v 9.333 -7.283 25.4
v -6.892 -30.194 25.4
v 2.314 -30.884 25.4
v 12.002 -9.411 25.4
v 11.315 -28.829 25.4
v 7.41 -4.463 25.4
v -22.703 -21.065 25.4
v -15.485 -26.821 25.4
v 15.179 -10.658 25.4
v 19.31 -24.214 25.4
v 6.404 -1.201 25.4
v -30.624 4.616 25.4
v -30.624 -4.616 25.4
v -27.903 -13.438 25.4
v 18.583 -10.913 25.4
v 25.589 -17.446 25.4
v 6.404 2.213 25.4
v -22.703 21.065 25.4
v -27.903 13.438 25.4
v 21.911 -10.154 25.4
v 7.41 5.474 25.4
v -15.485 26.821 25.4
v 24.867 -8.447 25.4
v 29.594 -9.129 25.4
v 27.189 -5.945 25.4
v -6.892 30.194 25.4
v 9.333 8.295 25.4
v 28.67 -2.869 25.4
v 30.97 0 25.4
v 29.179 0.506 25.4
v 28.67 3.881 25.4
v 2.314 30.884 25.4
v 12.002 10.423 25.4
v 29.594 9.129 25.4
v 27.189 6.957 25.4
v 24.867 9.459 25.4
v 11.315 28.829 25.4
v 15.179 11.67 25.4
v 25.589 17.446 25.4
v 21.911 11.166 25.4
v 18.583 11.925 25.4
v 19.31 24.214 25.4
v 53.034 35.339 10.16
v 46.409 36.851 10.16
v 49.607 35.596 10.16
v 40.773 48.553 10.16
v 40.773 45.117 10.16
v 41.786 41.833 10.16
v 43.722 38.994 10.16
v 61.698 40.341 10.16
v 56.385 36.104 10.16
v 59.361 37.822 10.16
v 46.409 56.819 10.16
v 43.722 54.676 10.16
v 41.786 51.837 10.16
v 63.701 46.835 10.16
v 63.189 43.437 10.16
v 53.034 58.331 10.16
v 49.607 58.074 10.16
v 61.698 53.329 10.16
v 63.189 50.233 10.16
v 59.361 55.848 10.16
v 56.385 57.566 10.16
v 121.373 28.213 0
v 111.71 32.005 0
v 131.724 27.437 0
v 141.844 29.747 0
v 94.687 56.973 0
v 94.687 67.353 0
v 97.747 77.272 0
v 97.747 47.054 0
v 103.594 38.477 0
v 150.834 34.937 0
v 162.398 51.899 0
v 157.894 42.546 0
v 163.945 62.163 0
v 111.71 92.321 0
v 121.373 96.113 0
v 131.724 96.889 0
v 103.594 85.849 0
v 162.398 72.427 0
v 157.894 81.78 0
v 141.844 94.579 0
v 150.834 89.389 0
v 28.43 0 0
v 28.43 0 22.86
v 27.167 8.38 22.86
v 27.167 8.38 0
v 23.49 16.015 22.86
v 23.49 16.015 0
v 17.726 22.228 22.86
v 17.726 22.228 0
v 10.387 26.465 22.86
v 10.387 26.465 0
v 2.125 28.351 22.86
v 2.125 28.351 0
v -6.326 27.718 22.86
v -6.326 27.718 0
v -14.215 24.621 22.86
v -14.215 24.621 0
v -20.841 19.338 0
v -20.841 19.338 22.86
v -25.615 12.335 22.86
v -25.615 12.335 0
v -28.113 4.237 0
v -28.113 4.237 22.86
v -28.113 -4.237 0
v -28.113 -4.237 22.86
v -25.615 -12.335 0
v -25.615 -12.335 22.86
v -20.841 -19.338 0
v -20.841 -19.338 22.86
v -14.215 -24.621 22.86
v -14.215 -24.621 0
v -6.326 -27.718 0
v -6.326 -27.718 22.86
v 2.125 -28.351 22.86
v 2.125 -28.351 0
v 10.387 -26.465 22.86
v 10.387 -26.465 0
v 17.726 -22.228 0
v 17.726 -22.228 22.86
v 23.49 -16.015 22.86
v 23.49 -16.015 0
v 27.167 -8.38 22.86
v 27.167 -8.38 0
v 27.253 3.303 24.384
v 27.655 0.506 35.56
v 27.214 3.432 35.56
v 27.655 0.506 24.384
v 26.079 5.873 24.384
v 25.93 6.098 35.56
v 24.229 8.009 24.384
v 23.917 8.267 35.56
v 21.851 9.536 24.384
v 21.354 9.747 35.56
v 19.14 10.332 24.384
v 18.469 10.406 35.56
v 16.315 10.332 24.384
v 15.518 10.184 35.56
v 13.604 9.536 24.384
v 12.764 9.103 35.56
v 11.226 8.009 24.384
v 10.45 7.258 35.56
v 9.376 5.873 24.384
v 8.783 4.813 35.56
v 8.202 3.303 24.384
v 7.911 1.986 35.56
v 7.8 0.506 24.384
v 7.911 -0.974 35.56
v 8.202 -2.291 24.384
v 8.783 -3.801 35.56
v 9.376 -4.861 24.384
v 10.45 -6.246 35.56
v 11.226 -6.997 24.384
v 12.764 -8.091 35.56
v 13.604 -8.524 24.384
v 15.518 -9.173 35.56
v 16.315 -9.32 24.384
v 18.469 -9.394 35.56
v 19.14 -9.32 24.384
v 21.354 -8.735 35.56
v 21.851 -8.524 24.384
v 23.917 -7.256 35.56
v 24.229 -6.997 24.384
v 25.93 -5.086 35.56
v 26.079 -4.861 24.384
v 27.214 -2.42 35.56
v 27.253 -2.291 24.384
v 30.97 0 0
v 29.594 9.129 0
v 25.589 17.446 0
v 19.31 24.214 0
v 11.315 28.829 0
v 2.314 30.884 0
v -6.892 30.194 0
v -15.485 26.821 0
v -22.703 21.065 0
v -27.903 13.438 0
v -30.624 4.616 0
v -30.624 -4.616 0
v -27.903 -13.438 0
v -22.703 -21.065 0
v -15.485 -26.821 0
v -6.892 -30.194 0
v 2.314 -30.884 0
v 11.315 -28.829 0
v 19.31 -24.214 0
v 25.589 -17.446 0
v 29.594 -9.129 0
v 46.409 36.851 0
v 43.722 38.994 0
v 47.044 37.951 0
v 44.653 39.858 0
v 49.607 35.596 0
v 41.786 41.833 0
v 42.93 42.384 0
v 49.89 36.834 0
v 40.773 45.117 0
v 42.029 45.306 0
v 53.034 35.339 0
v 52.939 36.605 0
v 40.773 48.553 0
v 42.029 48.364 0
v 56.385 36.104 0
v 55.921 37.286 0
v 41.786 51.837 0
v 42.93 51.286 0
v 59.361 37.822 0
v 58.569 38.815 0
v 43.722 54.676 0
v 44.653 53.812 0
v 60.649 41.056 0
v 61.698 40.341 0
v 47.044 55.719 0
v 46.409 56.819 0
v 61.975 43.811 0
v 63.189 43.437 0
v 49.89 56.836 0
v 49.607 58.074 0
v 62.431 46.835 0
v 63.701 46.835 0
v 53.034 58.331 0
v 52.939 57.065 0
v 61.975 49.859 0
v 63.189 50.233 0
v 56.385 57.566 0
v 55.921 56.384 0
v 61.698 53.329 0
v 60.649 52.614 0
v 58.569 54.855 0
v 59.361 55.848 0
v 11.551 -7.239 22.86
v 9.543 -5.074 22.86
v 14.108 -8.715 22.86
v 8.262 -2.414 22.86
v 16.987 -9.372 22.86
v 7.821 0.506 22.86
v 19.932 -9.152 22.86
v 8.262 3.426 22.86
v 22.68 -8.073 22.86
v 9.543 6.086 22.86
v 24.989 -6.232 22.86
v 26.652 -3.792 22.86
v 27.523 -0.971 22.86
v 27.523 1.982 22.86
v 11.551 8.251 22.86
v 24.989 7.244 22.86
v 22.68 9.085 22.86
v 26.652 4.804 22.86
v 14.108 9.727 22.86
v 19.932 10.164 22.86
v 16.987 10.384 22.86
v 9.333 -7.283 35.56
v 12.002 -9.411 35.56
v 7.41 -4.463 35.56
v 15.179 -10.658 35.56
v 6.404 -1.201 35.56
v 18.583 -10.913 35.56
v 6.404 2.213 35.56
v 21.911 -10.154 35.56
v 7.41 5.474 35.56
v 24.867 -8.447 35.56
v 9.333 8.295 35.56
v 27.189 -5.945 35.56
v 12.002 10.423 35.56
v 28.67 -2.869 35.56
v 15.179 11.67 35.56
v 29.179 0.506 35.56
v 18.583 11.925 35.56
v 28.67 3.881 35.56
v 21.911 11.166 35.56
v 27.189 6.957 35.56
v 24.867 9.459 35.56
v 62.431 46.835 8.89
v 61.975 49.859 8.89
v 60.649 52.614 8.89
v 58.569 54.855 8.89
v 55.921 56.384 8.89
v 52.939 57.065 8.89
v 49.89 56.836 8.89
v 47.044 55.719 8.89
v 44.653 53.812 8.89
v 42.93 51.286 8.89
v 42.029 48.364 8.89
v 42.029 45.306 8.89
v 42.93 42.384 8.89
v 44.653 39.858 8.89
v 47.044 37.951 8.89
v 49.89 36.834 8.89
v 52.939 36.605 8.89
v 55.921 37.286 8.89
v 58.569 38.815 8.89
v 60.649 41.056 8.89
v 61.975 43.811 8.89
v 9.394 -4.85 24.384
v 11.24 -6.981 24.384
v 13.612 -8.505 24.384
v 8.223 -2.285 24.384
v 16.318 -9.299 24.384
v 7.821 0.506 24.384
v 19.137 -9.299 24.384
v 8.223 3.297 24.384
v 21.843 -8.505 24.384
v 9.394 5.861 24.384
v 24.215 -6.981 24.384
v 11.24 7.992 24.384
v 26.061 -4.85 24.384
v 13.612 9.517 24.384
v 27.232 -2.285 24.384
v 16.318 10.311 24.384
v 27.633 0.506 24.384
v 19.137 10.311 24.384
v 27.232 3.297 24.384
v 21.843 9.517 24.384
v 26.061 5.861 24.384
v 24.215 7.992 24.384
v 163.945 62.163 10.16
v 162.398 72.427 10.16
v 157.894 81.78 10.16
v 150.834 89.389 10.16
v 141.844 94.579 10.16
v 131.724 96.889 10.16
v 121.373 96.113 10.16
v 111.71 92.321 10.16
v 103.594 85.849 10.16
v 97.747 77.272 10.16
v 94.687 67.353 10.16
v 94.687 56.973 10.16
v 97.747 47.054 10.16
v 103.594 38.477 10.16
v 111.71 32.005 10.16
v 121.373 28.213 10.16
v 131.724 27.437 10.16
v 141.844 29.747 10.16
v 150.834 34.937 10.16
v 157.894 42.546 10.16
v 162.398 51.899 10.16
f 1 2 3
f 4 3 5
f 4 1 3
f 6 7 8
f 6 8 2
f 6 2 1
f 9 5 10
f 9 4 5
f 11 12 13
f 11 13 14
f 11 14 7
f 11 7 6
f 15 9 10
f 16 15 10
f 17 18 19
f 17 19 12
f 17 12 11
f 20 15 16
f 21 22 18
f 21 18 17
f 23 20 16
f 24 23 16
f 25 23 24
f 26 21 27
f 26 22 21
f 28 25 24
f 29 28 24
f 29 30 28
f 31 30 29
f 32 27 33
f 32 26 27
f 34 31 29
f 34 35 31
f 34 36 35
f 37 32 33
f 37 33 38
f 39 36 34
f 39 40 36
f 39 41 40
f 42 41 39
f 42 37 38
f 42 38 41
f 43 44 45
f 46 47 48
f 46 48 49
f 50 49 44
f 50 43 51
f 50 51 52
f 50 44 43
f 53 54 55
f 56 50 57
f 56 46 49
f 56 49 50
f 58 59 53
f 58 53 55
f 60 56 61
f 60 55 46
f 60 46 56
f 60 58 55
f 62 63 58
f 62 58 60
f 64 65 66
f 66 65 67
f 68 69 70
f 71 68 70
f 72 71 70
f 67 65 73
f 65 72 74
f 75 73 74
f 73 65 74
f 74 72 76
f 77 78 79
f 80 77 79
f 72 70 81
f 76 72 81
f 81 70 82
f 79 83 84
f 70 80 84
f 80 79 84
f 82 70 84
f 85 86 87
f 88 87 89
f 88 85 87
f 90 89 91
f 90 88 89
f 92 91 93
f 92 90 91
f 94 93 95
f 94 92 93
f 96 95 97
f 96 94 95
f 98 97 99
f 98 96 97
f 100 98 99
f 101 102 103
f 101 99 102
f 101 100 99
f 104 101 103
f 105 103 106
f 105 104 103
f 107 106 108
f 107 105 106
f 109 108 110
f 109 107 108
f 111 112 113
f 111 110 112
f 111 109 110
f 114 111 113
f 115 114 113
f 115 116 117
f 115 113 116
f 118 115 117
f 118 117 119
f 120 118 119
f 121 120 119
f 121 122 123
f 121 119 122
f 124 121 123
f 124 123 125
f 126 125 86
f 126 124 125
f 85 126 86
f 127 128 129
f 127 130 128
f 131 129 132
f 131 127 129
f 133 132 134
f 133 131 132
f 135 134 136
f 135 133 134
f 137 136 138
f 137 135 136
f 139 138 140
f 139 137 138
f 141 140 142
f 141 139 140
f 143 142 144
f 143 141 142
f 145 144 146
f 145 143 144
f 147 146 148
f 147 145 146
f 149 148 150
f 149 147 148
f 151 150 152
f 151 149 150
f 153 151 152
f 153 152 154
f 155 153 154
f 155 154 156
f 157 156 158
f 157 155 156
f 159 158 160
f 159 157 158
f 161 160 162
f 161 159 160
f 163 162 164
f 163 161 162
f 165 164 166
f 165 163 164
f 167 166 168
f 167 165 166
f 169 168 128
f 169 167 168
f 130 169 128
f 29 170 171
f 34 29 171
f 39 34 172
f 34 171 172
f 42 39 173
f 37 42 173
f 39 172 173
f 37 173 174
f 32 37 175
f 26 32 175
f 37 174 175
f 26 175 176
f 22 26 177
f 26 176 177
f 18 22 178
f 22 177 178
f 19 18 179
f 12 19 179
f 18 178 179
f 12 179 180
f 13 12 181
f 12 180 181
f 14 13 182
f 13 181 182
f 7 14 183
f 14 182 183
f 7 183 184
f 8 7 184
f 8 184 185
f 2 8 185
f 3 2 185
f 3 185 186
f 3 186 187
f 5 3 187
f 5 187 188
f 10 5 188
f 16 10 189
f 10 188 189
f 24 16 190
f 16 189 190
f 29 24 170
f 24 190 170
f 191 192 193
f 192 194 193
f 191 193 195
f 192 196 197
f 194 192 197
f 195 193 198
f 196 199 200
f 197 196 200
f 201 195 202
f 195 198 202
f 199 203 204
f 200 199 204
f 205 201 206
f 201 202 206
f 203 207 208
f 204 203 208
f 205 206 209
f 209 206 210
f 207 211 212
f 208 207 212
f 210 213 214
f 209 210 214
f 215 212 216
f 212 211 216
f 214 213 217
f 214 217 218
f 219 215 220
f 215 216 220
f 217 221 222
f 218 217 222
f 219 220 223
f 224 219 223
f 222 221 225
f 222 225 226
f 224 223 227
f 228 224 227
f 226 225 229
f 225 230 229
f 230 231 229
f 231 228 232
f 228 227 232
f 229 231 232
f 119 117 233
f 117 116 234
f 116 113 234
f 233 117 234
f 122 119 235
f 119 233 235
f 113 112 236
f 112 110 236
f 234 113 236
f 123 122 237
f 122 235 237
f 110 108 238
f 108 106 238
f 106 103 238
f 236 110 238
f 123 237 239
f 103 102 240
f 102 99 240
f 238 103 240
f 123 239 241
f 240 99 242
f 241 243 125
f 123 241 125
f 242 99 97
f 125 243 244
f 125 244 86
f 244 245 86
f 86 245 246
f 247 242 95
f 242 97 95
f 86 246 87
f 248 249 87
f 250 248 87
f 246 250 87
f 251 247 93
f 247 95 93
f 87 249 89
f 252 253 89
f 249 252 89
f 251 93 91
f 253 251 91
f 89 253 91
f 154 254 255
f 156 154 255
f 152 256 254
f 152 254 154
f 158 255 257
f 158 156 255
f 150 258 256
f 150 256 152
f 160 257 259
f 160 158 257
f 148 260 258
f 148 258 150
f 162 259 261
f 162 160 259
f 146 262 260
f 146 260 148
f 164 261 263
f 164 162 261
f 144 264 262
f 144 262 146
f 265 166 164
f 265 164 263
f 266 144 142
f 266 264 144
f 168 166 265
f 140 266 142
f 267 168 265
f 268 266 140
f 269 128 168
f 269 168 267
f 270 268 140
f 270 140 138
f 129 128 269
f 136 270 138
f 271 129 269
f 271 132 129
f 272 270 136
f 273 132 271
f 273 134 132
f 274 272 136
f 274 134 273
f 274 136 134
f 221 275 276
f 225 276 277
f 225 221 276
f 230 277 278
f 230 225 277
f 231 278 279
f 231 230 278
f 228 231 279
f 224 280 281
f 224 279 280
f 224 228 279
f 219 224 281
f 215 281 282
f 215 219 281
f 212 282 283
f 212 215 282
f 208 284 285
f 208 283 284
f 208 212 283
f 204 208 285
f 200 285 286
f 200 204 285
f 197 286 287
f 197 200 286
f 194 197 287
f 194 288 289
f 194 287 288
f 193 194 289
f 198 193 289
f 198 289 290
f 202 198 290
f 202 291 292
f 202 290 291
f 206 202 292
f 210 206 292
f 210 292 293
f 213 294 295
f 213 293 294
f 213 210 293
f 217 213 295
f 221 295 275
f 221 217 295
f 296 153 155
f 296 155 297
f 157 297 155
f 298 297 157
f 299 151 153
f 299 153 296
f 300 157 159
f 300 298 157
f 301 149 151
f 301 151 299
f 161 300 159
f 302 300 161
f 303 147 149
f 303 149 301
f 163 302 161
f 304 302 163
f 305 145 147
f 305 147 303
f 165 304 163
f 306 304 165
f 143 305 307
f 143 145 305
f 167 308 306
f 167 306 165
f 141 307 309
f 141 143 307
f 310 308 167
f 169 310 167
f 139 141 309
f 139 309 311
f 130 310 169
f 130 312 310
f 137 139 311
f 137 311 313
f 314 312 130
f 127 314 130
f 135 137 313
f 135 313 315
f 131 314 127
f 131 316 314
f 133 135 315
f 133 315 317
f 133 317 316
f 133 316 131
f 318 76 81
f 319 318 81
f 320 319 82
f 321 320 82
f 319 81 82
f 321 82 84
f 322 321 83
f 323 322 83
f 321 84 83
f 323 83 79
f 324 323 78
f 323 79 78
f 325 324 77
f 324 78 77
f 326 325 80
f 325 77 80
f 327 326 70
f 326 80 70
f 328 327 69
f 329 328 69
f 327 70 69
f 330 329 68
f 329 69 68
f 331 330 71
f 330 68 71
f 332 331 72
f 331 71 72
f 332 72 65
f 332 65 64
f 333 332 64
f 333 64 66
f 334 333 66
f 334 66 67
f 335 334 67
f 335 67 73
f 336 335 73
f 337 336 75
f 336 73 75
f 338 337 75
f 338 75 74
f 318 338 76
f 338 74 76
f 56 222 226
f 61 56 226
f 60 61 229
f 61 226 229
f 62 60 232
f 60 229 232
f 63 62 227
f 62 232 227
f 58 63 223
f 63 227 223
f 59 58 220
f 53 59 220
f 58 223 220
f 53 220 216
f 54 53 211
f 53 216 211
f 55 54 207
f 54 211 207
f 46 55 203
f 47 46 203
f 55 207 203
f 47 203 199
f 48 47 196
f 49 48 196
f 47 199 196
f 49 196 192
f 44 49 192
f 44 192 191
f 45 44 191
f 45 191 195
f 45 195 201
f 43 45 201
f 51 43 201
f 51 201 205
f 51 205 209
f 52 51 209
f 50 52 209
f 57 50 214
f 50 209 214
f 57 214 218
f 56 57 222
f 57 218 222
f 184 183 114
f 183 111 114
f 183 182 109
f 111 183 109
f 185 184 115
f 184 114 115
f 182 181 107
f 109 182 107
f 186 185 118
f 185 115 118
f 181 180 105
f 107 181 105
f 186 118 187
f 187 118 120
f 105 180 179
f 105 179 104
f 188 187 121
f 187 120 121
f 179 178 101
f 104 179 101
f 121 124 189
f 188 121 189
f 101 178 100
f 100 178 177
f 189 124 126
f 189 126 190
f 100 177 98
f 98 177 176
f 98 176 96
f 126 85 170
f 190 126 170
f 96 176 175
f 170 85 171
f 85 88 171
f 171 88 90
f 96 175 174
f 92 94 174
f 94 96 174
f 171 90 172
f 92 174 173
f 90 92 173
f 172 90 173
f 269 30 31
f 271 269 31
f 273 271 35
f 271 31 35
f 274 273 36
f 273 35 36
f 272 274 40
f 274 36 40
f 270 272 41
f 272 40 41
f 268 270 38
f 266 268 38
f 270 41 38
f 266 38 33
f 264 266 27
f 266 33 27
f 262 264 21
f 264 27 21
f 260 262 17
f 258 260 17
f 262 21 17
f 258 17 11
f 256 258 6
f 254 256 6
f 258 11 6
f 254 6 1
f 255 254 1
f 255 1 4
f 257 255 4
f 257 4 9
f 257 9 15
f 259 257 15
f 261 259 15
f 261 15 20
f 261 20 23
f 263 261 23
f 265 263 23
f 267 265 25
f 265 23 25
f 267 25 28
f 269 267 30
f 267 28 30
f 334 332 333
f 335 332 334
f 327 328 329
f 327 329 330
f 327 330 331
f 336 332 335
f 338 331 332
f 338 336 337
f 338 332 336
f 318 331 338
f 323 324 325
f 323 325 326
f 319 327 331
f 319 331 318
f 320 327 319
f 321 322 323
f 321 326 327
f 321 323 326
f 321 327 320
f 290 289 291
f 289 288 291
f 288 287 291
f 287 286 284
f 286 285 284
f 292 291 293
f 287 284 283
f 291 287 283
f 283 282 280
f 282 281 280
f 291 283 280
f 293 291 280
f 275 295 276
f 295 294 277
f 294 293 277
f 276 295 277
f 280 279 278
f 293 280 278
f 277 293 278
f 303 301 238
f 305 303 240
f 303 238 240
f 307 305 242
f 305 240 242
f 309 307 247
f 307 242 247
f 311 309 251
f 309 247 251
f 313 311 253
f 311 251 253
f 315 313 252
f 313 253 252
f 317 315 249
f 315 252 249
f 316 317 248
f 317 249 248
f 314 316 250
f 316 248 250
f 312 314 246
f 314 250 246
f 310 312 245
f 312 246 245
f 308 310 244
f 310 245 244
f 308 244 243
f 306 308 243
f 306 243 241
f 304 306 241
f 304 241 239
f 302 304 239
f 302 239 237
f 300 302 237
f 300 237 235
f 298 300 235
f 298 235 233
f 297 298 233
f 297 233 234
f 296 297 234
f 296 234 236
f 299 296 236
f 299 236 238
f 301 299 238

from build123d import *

# Parameters (mm, degrees)
F0_R      = 30.970353642
F1_DEPTH  = 25.4
F2_T      = -2.54
F4_R      = 11.4513945414
F5_DEPTH  = 10.16
F6_T      = -1.524
F8_D      = 19.812
F9_R      = 11.5283057716
F10_DEPTH = 10.16
F9_R_2    = 34.8231609138
F11_T     = -1.27


with BuildPart() as f1:
    # F0 (on Top) → F1 (new body)
    with BuildSketch(Plane.XY):
        Circle(F0_R)
    extrude(amount=F1_DEPTH)

    # F2
    f2_openings = [f1.faces().sort_by_distance(p)[0] for p in [
        (0, 0, 0),
    ]]
    offset(amount=F2_T, openings=f2_openings)

    # F4 (on offset) → F5 (join)
    with BuildSketch(Plane.XY.offset(25.4)):
        with Locations((17.7274942398, 0.5059055984)):
            Circle(F4_R)
    extrude(amount=F5_DEPTH)

    # F6
    f6_openings = [f1.faces().sort_by_distance(p)[0] for p in [
        (17.727494, 0.505906, 35.56),
    ]]
    offset(amount=F6_T, openings=f6_openings, kind=Kind.INTERSECTION)

    # F8 (through all)
    with Locations(Plane.XY.offset(24.384)):
        with Locations((17.7274942398, 0.5059055984)):
            Hole(F8_D / 2)


with BuildPart() as f10:
    # F9 (on Top) → F10 (new body)
    with BuildSketch(Plane.XY):
        with Locations((52.172742784, 46.8350797892)):
            Circle(F9_R)
    extrude(amount=F10_DEPTH)

    # F11
    f11_openings = [f10.faces().sort_by_distance(p)[0] for p in [
        (52.172743, 46.83508, 0),
    ]]
    offset(amount=F11_T, openings=f11_openings)


with BuildPart() as f10b:
    # F9 (on Top) → F10, piece 2 (new body)
    with BuildSketch(Plane.XY):
        with Locations((129.1216164827, 62.1629469097)):
            Circle(F9_R_2)
    extrude(amount=F10_DEPTH)


solid = Compound([f1.part, f10.part, f10b.part])
